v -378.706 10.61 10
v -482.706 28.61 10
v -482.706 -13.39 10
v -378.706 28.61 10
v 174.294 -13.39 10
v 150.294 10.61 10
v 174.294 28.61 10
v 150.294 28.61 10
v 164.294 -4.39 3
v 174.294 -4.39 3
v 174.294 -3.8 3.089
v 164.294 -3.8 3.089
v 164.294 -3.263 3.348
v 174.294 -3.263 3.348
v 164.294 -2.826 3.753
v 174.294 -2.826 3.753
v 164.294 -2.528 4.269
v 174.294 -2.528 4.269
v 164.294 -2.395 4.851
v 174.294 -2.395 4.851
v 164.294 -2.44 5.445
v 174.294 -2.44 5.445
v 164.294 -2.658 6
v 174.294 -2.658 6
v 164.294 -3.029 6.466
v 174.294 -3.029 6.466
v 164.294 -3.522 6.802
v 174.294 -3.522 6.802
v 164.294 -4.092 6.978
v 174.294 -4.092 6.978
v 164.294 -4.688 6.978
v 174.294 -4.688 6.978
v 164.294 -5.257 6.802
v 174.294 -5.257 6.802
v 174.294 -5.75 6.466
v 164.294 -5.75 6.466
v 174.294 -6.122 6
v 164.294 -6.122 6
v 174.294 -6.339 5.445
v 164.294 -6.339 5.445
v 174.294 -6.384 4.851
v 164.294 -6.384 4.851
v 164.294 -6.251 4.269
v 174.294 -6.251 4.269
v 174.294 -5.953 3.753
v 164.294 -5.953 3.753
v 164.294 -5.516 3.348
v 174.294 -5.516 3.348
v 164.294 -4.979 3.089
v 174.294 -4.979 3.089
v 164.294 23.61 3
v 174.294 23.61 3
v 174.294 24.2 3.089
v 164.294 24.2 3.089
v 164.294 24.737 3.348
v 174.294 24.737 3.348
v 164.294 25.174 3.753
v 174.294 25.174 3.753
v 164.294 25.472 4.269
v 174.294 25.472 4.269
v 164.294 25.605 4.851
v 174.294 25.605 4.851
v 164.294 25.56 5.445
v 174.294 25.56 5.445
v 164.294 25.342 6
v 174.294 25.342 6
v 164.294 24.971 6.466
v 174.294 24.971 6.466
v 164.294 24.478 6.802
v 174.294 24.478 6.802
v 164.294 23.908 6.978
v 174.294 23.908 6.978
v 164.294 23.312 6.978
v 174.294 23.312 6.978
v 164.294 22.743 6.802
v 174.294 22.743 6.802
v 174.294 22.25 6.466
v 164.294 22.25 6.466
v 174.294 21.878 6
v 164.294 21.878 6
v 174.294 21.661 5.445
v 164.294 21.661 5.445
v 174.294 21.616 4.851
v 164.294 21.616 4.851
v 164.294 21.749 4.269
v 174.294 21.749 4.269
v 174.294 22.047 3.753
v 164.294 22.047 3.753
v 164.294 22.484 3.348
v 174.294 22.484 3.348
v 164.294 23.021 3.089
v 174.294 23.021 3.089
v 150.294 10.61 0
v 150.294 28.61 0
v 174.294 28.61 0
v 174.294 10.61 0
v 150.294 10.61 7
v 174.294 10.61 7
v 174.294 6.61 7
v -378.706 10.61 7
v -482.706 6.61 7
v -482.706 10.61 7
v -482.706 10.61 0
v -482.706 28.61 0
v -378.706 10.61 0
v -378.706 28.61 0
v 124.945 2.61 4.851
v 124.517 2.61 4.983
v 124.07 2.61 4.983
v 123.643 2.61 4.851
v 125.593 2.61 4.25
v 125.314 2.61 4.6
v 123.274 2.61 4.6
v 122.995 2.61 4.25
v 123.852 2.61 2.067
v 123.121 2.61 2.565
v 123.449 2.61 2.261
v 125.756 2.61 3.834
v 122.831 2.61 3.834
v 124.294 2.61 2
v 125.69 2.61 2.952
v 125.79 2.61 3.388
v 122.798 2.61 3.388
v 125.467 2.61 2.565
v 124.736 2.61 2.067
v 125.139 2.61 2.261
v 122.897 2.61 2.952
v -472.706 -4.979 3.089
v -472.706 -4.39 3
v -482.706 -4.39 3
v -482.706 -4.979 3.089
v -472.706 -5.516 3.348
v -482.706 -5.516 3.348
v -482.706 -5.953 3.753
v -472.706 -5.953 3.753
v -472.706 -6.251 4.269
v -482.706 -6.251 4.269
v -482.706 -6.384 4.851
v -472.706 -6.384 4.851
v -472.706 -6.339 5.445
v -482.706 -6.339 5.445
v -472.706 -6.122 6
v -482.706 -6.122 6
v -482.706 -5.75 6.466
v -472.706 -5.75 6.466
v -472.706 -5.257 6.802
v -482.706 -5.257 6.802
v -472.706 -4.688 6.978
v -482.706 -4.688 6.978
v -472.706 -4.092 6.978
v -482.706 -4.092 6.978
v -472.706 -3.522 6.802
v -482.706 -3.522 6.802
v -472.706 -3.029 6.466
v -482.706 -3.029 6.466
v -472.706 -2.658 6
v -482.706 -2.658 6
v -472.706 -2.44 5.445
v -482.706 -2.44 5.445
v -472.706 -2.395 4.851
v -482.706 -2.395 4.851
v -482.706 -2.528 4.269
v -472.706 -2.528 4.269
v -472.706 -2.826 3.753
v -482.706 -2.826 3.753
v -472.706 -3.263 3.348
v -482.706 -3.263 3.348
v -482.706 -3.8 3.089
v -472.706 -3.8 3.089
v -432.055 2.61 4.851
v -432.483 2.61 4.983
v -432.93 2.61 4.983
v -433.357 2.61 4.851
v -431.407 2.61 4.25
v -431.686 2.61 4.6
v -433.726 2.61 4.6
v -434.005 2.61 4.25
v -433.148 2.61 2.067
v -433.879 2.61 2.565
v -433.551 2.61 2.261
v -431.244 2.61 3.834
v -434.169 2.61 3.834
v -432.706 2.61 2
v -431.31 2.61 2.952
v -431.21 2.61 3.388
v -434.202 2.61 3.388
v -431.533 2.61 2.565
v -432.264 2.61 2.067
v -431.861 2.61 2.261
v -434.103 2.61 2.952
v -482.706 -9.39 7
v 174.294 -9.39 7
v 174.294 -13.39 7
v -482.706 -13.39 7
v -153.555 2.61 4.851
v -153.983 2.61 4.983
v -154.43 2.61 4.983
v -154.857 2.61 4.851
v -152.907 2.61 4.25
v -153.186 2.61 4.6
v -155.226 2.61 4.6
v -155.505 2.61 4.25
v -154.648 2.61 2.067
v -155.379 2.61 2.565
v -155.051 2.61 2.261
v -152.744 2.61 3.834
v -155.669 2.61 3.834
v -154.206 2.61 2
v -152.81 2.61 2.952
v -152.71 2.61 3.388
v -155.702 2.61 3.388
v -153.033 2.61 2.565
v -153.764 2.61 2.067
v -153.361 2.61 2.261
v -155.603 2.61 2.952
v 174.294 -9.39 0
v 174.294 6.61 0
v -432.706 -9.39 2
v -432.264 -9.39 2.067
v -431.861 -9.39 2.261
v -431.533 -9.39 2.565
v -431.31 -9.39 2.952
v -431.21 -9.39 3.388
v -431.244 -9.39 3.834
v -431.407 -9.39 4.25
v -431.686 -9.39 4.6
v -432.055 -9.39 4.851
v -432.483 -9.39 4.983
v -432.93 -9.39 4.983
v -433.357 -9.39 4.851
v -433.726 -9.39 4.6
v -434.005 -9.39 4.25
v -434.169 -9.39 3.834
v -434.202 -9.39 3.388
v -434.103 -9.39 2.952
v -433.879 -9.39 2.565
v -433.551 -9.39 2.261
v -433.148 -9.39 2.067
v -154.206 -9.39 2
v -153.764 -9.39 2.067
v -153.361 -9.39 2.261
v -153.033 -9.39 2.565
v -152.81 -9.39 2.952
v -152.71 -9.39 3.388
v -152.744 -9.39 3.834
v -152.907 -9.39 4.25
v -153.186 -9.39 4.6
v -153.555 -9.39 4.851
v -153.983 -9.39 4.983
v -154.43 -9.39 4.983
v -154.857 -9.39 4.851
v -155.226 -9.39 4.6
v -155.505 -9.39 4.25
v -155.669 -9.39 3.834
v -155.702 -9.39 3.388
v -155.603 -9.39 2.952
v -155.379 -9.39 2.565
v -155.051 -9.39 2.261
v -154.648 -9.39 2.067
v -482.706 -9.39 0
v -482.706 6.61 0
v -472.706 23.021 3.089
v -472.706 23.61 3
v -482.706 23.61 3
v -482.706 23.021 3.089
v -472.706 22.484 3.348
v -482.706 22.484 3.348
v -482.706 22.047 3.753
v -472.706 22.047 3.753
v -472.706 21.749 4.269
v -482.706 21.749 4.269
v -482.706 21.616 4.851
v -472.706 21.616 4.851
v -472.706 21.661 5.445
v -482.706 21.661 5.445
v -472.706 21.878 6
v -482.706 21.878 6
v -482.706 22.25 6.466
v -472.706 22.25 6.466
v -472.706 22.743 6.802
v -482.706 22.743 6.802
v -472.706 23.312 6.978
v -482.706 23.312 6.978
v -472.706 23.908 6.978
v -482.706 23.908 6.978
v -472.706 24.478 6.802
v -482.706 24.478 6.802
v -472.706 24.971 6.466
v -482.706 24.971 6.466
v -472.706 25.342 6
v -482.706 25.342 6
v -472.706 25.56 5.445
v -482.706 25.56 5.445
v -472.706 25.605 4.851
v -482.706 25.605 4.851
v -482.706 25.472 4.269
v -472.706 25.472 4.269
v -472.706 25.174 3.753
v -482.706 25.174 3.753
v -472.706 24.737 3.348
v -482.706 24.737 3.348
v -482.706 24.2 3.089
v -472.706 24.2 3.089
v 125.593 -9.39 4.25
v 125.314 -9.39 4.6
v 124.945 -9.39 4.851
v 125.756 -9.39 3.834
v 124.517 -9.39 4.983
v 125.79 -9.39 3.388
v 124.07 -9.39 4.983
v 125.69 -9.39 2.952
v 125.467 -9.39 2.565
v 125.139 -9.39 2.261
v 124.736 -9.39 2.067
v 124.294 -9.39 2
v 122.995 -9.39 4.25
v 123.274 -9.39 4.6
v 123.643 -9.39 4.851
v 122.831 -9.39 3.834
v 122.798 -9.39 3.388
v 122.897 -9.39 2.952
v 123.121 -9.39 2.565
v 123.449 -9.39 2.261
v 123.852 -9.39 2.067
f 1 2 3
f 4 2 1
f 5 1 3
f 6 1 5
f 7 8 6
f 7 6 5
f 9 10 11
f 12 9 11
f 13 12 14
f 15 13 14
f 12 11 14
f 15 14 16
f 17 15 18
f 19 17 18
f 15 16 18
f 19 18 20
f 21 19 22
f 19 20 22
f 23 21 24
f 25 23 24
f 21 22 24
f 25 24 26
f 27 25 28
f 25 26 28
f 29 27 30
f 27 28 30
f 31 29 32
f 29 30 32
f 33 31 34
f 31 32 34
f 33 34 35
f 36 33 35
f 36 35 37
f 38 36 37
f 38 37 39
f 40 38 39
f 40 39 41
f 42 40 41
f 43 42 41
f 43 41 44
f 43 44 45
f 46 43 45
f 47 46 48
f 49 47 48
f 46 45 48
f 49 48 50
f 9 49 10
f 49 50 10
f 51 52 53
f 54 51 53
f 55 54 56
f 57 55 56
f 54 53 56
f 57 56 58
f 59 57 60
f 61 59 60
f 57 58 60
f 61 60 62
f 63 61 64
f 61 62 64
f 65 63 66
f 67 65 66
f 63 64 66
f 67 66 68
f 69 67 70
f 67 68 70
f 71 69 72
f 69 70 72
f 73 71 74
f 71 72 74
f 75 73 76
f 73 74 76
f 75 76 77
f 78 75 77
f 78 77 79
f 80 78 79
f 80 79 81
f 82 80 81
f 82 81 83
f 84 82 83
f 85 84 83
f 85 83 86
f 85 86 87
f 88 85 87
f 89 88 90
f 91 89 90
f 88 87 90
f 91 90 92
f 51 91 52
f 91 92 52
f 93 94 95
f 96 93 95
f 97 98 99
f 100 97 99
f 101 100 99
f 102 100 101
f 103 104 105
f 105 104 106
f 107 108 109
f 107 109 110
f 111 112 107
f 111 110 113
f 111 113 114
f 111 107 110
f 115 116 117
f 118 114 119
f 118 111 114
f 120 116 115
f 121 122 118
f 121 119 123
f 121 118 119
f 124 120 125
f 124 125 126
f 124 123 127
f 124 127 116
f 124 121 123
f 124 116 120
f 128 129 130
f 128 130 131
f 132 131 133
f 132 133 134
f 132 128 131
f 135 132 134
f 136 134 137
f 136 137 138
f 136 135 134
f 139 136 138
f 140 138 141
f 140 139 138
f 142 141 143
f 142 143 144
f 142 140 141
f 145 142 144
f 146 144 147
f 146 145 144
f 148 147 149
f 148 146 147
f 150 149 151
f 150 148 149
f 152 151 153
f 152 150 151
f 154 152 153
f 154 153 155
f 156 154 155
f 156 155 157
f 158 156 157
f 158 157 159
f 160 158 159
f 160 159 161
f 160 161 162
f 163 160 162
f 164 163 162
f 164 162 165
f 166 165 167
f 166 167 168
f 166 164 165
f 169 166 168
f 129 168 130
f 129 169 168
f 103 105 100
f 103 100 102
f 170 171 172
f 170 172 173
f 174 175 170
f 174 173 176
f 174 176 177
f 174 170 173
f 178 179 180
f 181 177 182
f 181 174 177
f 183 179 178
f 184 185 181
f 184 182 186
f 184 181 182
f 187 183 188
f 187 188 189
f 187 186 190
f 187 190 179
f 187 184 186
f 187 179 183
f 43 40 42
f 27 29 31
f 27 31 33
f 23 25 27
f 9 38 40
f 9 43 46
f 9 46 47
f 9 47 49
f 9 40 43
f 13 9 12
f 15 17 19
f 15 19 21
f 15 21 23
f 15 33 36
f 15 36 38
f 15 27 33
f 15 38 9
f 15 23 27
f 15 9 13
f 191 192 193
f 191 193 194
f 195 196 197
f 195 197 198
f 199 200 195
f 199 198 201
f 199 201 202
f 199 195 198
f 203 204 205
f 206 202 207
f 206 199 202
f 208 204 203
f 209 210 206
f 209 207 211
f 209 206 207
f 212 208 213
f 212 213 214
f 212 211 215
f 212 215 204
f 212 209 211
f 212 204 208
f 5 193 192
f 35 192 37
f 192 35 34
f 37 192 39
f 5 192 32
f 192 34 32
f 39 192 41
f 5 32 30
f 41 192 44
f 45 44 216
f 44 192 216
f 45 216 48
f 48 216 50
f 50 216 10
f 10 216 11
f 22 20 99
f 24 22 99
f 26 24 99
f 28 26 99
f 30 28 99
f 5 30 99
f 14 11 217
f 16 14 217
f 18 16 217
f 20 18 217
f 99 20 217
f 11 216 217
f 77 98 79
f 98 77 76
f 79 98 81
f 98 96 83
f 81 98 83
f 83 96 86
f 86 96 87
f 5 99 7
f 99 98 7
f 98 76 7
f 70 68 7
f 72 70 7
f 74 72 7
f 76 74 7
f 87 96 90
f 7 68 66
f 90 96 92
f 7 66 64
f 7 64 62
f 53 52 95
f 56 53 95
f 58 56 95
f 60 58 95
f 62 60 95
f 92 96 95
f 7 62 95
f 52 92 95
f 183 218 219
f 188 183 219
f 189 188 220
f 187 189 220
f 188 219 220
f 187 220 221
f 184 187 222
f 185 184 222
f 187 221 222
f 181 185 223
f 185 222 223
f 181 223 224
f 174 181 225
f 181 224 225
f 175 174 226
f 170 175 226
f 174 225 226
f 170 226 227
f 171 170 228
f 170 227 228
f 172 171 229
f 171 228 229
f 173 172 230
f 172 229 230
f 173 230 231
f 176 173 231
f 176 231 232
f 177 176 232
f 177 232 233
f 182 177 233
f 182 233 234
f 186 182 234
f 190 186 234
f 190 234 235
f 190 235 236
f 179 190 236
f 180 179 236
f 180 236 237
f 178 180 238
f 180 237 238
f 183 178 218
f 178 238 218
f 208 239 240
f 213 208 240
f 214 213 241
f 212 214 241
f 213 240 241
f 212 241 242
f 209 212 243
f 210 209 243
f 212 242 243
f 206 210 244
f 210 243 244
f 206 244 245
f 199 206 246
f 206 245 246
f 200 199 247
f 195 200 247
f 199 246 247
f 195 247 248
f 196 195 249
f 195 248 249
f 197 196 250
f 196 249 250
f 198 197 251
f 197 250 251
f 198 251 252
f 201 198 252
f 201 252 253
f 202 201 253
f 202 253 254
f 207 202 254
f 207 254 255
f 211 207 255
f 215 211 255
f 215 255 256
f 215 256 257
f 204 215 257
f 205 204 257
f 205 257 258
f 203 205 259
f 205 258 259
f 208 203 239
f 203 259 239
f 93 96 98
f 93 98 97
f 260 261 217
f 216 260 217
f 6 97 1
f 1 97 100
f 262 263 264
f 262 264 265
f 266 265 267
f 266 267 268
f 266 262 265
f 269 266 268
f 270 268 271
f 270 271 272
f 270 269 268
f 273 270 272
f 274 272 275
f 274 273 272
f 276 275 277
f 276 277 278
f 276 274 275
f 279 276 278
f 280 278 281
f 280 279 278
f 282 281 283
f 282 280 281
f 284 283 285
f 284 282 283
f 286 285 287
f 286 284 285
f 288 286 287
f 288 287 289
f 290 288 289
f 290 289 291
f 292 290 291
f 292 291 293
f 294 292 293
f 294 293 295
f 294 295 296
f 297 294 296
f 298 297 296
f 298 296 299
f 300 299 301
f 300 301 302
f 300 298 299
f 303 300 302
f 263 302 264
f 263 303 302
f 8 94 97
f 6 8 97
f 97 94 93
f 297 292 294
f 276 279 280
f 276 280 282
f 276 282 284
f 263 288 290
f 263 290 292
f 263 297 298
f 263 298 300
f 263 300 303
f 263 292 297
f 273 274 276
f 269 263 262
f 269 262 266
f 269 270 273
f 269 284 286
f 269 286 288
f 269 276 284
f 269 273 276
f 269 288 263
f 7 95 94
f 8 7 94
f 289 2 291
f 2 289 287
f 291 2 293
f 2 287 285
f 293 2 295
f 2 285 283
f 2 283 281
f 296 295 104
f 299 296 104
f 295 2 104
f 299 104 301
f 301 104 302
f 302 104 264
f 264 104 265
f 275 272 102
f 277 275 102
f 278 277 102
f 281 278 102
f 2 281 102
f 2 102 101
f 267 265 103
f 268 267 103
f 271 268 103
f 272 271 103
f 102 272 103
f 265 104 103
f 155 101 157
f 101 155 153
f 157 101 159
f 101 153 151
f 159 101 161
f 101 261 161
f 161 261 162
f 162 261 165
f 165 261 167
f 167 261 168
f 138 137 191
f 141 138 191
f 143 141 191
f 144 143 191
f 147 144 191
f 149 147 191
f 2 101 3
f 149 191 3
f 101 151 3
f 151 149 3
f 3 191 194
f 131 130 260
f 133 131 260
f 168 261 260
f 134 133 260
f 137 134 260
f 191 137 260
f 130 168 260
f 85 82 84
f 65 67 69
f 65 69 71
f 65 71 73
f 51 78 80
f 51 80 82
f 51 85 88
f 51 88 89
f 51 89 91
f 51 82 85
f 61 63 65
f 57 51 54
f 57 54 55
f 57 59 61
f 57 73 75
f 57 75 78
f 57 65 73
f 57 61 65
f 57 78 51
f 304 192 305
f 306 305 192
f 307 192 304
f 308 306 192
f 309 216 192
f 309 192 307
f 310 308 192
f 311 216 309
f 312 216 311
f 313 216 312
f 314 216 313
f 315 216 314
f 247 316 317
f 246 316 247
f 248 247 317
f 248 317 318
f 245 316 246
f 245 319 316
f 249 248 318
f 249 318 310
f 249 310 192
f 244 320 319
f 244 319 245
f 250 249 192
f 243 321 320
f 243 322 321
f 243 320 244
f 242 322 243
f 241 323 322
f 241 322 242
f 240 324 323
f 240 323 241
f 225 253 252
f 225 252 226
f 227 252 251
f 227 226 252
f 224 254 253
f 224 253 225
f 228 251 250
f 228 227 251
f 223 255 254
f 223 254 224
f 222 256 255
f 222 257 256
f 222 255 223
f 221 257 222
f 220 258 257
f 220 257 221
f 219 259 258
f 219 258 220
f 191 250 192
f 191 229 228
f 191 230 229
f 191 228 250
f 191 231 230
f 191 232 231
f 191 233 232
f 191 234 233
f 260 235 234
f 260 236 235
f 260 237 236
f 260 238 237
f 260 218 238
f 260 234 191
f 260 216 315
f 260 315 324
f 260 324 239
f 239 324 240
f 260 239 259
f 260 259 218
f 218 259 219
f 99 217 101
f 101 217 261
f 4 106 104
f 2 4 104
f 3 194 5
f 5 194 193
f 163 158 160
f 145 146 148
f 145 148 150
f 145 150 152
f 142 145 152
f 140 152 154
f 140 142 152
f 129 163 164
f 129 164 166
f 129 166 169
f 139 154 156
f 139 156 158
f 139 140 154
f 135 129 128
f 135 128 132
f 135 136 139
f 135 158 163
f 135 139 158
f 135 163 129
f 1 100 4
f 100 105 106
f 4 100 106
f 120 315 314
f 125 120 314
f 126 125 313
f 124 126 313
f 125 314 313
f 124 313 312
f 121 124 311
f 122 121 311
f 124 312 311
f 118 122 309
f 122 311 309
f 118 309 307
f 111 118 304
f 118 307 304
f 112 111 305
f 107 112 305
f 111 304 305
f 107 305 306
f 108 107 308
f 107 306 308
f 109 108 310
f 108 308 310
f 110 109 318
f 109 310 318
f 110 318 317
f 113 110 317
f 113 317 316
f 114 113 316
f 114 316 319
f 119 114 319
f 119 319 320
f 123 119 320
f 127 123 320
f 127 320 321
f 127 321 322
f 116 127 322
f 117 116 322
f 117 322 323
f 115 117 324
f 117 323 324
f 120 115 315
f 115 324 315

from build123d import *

# Parameters (mm, degrees)
BOSS_EXTRUDE1_DEPTH = 10
SKETCH2_W           = 657
SKETCH2_H           = 4
CUT_EXTRUDE1_DEPTH  = 7
SKETCH3_W           = 657
SKETCH3_H           = 4
CUT_EXTRUDE2_DEPTH  = 7
SKETCH4_R           = 1.5
CUT_EXTRUDE3_DEPTH  = 12
SKETCH6_R           = 2
CUT_EXTRUDE4_DEPTH  = 10
CUT_EXTRUDE5_START  = -10
SKETCH7_R           = 2
CUT_EXTRUDE5_DEPTH  = 10


with BuildPart() as part:
    # Sketch1 → Boss-Extrude1 (new body)
    with BuildSketch(Plane.XY):
        Polygon((-482.706212002, 28.610388863), (-482.706212002, -13.389611137), (174.293787998, -13.389611137), (174.293787998, 28.610388863), (150.293787998, 28.610388863), (150.293787998, 10.610388863), (-378.706212002, 10.610388863), (-378.706212002, 28.610388863), align=None)
    extrude(amount=BOSS_EXTRUDE1_DEPTH)

    # Sketch2 → Cut-Extrude1 (cut)
    with BuildSketch(Plane(origin=(0, 0, 0), x_dir=(-1, 0, 0), z_dir=(0, 0, -1))):
        with Locations((154.206212002, 8.610388863)):
            Rectangle(SKETCH2_W, SKETCH2_H)
    extrude(amount=-CUT_EXTRUDE1_DEPTH, mode=Mode.SUBTRACT)

    # Sketch3 → Cut-Extrude2 (cut)
    with BuildSketch(Plane(origin=(0, 0, 0), x_dir=(-1, 0, 0), z_dir=(0, 0, -1))):
        with Locations((154.206212002, -11.389611137)):
            Rectangle(SKETCH3_W, SKETCH3_H)
    extrude(amount=-CUT_EXTRUDE2_DEPTH, mode=Mode.SUBTRACT)

    # Sketch4 → Cut-Extrude3 (cut)
    with BuildSketch(Plane.XZ.offset(9.389611137)):
        with Locations(Location((-432.706212002, 3.5, 0), (0, 0, 270))):
            Circle(SKETCH4_R)
        with Locations(Location((-154.206212002, 3.5, 0), (0, 0, 270))):
            Circle(SKETCH4_R)
        with Locations(Location((124.293787998, 3.5, 0), (0, 0, 270))):
            Circle(SKETCH4_R)
    extrude(amount=-CUT_EXTRUDE3_DEPTH, mode=Mode.SUBTRACT)

    # Sketch6 → Cut-Extrude4 (cut)
    with BuildSketch(Plane(origin=(174.293787998, 0, 0), x_dir=(0, 0, -1), z_dir=(1, 0, 0))):
        with Locations((-5, 23.610388863)):
            Circle(SKETCH6_R)
        with Locations((-5, -4.389611137)):
            Circle(SKETCH6_R)
    extrude(amount=-CUT_EXTRUDE4_DEPTH, mode=Mode.SUBTRACT)

    # Sketch7 → Cut-Extrude5 (cut)
    with BuildSketch(Plane.ZY.offset(482.706212002).offset(CUT_EXTRUDE5_START)):
        with Locations(Location((5, 23.610388863, 0), (0, 0, 180))):
            Circle(SKETCH7_R)
        with Locations(Location((5, -4.389611137, 0), (0, 0, 180))):
            Circle(SKETCH7_R)
    extrude(amount=CUT_EXTRUDE5_DEPTH, mode=Mode.SUBTRACT)


solid = part.part
